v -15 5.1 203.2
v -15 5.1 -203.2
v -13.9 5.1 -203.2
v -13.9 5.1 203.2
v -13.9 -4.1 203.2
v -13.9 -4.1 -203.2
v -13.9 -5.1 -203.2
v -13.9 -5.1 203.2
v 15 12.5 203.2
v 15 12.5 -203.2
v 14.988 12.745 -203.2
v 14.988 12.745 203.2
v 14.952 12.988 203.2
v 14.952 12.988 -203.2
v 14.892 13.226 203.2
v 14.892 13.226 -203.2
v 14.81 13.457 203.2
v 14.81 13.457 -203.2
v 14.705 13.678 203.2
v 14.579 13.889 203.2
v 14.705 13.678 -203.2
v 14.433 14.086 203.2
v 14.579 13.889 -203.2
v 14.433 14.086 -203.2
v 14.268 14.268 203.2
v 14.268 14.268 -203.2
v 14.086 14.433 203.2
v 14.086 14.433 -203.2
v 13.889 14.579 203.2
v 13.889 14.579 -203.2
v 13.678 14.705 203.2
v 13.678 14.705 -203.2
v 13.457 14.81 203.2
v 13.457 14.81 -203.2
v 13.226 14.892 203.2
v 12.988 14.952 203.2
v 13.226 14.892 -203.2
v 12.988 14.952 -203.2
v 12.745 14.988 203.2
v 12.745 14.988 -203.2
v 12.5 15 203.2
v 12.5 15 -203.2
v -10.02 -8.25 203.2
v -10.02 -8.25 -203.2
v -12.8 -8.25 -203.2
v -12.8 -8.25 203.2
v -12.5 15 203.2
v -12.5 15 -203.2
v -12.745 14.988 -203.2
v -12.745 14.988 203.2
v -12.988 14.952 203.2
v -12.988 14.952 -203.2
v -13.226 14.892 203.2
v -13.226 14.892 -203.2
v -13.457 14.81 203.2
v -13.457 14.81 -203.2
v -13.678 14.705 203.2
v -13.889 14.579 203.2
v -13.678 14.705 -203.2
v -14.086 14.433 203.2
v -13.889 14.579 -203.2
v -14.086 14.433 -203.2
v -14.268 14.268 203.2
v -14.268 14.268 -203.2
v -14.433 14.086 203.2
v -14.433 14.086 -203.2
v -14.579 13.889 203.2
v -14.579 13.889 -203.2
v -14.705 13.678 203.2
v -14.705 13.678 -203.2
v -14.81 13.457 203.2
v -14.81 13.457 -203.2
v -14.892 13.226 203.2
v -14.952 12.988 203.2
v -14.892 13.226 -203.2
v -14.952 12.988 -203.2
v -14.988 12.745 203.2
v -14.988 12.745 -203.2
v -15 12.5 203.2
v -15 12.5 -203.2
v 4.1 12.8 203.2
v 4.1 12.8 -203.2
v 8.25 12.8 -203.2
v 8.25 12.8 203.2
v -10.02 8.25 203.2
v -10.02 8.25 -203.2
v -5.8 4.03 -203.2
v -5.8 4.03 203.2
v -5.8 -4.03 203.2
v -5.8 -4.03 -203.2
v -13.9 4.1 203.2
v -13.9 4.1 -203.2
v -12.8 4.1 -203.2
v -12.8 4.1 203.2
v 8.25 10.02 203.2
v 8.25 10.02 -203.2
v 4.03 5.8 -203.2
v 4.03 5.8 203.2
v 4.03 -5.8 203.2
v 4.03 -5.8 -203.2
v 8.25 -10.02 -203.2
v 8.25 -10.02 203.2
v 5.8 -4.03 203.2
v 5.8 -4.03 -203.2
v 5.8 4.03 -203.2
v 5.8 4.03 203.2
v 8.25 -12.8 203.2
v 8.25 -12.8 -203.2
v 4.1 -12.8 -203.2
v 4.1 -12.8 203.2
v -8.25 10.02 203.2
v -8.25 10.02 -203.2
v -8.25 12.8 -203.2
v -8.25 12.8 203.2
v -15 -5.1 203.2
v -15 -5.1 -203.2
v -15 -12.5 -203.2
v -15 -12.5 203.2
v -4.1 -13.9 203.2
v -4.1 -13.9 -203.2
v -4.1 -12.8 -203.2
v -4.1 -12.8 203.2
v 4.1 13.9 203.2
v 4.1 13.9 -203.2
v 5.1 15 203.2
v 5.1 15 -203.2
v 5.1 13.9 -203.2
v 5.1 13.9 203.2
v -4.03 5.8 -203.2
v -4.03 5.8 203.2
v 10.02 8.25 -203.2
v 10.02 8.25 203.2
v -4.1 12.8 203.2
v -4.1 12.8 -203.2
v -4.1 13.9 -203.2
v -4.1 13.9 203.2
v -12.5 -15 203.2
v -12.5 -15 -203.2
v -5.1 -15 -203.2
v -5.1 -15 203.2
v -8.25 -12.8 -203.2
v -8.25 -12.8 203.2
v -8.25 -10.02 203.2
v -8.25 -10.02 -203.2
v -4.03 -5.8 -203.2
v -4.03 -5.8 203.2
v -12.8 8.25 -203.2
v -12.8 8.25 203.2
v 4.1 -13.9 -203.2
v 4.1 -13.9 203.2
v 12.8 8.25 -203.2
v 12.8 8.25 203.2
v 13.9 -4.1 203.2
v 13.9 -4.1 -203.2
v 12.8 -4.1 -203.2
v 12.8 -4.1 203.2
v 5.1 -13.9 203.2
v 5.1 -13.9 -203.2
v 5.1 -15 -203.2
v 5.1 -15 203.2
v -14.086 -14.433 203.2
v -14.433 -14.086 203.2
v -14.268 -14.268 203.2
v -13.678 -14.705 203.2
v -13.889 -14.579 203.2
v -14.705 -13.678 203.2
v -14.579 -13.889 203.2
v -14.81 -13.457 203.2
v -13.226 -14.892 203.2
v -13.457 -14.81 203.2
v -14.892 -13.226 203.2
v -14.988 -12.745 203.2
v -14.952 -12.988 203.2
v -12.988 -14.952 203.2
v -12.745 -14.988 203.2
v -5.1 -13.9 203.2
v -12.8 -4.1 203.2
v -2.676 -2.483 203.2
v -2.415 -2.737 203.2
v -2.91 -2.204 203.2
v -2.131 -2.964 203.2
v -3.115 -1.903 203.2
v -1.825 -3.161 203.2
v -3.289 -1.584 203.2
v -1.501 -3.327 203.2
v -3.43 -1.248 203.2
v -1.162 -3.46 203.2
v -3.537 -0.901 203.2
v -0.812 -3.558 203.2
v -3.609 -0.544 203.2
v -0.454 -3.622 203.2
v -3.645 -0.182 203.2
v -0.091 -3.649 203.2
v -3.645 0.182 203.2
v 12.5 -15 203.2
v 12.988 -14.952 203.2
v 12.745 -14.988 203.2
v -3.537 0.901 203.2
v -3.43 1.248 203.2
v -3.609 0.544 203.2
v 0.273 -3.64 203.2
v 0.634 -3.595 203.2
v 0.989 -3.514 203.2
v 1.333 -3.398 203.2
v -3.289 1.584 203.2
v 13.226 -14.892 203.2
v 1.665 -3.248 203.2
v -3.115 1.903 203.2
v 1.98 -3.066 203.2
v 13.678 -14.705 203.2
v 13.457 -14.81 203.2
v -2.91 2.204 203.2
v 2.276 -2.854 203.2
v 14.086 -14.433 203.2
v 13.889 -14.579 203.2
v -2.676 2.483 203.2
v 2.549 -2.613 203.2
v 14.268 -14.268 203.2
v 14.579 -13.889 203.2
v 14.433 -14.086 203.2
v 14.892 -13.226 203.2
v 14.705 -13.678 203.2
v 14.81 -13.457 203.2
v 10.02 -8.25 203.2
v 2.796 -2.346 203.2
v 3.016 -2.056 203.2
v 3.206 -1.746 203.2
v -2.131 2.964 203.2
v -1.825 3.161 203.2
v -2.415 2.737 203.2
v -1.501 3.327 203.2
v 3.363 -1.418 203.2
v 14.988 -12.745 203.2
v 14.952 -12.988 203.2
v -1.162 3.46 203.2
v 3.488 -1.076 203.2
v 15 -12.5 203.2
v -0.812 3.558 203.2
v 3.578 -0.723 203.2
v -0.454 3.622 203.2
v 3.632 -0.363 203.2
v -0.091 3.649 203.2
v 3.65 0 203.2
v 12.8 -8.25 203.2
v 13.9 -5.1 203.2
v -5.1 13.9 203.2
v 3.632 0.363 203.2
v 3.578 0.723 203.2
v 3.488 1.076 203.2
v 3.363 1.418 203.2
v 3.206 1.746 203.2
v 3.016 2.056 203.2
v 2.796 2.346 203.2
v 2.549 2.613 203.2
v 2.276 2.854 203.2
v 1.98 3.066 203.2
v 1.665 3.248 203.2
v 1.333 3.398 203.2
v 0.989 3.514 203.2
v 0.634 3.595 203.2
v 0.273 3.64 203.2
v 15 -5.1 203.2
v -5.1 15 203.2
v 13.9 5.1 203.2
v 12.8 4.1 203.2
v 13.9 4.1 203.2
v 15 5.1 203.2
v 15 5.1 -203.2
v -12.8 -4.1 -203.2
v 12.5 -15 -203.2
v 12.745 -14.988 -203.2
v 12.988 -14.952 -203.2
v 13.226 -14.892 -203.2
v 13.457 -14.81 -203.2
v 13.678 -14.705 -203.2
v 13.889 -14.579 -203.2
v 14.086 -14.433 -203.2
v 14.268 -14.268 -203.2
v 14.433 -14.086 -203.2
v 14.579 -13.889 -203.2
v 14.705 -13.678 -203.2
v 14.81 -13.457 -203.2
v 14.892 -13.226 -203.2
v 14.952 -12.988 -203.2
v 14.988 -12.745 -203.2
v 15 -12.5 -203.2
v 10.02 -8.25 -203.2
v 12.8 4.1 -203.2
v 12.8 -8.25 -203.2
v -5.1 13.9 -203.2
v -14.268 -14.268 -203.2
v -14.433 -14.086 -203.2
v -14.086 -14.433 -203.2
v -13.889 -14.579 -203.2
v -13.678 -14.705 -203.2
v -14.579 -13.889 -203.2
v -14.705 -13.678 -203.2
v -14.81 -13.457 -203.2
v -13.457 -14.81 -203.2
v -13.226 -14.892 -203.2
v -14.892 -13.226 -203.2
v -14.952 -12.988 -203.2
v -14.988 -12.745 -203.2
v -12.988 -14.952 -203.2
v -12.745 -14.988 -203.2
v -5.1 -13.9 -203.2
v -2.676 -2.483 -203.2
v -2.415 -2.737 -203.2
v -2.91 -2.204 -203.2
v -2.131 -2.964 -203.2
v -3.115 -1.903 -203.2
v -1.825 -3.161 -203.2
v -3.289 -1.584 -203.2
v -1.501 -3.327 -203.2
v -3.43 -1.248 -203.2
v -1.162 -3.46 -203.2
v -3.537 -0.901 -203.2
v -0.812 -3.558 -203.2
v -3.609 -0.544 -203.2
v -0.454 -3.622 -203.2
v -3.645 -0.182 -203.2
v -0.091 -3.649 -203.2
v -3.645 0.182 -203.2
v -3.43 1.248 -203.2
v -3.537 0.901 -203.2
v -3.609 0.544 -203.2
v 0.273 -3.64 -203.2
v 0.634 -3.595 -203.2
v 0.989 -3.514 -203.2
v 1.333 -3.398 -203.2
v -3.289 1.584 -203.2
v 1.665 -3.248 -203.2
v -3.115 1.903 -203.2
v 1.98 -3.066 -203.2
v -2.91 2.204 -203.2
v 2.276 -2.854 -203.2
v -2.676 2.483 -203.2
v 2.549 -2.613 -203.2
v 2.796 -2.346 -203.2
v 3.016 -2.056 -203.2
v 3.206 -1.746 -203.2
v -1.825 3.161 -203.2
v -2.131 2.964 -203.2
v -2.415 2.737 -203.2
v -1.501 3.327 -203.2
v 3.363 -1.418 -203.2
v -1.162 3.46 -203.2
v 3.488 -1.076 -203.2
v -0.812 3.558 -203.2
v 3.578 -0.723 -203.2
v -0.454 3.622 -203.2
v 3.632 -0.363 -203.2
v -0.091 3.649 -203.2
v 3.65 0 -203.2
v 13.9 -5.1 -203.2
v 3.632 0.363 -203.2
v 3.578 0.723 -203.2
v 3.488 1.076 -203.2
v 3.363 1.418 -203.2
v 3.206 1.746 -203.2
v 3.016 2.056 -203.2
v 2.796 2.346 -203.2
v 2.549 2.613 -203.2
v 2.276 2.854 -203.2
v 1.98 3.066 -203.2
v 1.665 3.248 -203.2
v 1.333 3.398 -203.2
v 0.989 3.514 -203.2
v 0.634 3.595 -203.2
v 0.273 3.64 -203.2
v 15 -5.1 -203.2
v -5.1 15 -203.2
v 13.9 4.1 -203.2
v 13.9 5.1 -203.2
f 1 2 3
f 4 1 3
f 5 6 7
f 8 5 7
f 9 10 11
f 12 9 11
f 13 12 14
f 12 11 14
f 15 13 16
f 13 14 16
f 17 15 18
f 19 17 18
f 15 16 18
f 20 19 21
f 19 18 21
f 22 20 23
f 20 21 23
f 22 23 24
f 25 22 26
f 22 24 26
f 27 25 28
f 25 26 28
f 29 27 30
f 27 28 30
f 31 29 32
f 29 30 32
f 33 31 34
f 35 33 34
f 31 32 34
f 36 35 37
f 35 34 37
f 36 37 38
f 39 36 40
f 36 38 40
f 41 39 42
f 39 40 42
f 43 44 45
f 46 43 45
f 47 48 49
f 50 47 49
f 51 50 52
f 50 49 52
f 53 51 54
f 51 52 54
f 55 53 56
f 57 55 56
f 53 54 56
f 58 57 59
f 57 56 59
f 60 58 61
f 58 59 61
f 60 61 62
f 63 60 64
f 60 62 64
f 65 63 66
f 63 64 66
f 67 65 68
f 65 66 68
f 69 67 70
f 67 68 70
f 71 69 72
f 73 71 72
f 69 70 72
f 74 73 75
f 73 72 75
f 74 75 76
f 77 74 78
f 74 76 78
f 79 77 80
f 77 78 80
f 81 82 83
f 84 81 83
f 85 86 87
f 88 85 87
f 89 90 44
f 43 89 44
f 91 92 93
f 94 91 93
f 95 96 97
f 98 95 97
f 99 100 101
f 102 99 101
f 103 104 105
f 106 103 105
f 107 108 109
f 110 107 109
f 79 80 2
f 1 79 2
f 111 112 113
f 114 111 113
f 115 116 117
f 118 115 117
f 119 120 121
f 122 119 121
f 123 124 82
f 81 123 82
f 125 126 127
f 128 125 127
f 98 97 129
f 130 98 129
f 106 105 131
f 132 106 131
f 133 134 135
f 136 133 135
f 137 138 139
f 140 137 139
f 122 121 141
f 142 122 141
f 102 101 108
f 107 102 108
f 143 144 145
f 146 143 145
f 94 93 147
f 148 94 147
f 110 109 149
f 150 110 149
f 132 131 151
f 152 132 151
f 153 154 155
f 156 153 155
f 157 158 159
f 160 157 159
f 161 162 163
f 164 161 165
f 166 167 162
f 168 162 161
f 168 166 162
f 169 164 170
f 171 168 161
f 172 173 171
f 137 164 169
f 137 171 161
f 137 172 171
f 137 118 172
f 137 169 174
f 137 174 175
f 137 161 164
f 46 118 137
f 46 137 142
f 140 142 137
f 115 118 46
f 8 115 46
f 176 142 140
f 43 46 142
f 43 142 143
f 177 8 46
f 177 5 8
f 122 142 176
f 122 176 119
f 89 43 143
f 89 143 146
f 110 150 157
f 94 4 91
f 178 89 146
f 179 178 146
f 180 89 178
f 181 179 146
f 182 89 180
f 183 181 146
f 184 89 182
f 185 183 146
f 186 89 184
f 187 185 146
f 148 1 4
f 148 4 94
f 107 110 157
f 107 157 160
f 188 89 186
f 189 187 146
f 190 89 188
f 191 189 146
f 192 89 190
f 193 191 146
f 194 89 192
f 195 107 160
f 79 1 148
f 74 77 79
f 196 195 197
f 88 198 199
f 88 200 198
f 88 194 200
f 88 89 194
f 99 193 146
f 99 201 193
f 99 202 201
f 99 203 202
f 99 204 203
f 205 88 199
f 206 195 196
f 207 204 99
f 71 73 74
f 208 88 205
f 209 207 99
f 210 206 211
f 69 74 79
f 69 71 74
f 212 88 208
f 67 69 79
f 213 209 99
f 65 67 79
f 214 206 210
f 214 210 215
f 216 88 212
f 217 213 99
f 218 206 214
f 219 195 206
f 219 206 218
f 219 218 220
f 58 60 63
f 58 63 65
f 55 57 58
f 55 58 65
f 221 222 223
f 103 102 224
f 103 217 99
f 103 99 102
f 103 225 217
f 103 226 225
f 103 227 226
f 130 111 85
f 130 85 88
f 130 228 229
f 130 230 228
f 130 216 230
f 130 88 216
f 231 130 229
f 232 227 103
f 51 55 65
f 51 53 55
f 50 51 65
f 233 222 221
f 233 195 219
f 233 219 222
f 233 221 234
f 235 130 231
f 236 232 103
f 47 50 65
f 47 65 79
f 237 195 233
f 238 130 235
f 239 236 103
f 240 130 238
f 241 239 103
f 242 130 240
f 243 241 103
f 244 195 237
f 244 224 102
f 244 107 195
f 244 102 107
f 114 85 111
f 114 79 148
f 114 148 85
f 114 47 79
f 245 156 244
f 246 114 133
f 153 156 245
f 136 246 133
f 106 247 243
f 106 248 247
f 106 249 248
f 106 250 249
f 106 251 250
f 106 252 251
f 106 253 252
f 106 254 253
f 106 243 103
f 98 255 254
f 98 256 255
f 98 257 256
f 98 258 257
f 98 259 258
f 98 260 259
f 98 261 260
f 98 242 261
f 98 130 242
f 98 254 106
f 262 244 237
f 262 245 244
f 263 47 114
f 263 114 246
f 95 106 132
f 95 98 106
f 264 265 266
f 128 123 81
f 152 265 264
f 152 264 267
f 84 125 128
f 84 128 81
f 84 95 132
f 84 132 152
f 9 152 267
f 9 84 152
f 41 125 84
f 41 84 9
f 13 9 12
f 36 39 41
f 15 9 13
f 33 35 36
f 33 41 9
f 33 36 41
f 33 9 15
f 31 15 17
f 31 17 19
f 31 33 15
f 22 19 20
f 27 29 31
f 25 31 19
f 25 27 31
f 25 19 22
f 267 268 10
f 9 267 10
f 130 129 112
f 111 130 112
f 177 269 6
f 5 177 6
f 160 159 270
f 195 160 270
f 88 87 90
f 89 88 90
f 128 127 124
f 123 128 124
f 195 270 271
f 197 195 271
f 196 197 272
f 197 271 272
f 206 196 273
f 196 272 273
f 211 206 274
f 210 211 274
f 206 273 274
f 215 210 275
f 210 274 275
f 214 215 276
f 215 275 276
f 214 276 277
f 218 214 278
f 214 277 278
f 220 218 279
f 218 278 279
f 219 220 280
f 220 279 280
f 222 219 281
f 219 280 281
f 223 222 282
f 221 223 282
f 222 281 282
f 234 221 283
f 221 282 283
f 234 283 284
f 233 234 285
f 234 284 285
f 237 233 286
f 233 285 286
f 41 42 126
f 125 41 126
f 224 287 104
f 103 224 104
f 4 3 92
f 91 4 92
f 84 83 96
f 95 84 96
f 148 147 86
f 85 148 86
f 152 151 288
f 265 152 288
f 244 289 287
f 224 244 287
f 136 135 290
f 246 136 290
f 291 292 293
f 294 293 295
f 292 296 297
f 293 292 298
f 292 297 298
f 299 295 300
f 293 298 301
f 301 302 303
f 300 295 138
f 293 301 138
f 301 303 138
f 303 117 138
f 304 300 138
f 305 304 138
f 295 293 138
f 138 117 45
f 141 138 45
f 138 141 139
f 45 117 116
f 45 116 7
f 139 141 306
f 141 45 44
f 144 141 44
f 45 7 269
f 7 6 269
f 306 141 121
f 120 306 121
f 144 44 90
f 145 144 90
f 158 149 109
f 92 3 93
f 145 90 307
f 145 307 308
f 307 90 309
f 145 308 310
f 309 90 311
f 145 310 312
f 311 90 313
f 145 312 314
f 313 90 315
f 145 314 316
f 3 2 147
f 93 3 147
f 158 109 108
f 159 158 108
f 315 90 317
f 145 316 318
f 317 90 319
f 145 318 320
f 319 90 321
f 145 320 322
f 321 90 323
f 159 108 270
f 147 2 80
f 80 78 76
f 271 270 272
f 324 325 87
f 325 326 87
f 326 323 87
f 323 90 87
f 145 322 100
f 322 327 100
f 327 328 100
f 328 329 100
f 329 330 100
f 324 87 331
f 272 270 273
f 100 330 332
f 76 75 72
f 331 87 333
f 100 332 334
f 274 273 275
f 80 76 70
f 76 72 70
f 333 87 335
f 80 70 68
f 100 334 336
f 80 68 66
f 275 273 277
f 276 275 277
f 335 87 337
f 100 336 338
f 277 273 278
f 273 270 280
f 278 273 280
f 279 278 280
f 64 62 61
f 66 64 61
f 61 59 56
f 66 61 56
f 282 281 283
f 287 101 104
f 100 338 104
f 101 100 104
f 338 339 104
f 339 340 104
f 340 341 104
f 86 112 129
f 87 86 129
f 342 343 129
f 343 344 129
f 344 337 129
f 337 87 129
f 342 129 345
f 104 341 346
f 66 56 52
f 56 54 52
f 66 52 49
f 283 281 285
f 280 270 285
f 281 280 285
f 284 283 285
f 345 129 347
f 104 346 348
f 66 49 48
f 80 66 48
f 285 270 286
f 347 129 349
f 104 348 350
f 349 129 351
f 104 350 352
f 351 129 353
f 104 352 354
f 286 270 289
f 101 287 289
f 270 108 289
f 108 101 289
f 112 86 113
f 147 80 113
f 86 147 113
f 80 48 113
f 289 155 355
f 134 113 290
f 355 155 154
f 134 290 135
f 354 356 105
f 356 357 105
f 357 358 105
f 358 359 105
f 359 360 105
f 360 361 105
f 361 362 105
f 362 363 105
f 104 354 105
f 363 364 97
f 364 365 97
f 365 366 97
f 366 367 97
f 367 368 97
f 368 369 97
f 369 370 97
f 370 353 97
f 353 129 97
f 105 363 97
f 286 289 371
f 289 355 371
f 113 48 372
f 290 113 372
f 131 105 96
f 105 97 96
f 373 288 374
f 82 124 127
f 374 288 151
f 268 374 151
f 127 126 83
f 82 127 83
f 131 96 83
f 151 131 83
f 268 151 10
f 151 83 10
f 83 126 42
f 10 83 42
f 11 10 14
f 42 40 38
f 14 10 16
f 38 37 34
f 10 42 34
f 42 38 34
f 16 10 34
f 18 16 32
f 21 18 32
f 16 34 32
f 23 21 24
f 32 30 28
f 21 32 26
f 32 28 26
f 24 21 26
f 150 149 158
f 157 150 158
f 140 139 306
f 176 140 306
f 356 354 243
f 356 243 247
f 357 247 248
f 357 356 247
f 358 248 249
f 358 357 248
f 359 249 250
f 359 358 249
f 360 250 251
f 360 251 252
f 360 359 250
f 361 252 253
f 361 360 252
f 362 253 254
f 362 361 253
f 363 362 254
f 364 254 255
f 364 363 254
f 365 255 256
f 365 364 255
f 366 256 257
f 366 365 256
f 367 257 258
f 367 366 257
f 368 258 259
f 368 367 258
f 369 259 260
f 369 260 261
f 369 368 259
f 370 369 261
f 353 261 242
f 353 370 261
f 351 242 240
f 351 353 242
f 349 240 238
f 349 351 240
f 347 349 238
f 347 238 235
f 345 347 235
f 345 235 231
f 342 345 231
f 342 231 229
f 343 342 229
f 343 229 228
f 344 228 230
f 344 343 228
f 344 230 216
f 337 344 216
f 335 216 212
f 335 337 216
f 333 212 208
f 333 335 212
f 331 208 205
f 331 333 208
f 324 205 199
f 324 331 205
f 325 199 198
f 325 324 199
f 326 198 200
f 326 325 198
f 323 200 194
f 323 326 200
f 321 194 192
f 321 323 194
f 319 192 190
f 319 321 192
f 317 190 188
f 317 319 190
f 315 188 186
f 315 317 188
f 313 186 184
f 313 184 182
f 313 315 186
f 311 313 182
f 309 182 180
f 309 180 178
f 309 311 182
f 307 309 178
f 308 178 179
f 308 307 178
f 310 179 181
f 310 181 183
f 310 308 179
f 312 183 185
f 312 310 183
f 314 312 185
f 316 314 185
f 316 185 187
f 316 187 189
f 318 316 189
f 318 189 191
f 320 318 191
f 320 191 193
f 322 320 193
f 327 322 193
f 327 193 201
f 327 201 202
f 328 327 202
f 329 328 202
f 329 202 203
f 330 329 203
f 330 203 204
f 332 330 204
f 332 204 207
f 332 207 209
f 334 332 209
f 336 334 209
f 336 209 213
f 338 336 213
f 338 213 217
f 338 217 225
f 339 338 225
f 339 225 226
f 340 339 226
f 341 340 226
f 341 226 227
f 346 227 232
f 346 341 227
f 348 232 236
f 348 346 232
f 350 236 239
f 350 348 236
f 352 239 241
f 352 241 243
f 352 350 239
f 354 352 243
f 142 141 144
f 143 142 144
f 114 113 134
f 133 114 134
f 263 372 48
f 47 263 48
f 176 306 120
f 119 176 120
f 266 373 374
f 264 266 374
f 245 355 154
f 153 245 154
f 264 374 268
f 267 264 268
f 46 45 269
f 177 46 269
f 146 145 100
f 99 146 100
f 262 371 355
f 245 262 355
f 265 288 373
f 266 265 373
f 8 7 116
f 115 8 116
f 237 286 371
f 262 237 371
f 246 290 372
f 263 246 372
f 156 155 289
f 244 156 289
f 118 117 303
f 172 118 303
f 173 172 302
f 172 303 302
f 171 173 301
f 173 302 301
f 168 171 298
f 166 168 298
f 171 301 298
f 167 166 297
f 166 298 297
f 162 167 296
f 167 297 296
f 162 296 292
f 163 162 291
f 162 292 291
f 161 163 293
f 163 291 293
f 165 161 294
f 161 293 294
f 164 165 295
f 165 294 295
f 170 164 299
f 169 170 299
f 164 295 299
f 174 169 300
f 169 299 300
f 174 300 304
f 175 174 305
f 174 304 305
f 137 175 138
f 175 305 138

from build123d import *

# Parameters (mm, degrees)
SKETCH11_R                          = 3.65
BOSCHREXROTH_BOSCH_30X30_V2_1_DEPTH = 406.4


with BuildPart() as part:
    # Sketch11 → Boschrexroth BOSCH_30X30_V2(1) (new body)
    with BuildSketch(Plane.XY.offset(-203.2)):
        with BuildLine():
            Line((0, 5.8), (-4.03, 5.8))
            Line((-4.03, 5.8), (-8.25, 10.02))
            Line((-8.25, 10.02), (-8.25, 12.8))
            Line((-8.25, 12.8), (-4.1, 12.8))
            Line((-4.1, 12.8), (-4.1, 13.9))
            Line((-4.1, 13.9), (-5.1, 13.9))
            Line((-5.1, 13.9), (-5.1, 15))
            Line((-5.1, 15), (-12.5, 15))
            ThreePointArc((-12.5, 15), (-14.267766953, 14.267766953), (-15, 12.5))
            Line((-15, 12.5), (-15, 5.1))
            Line((-15, 5.1), (-13.9, 5.1))
            Line((-13.9, 5.1), (-13.9, 4.1))
            Line((-13.9, 4.1), (-12.8, 4.1))
            Line((-12.8, 4.1), (-12.8, 8.25))
            Line((-12.8, 8.25), (-10.02, 8.25))
            Line((-10.02, 8.25), (-5.8, 4.03))
            Line((-5.8, 4.03), (-5.8, 0))
            Line((-5.8, 0), (-5.8, -4.03))
            Line((-5.8, -4.03), (-10.02, -8.25))
            Line((-10.02, -8.25), (-12.8, -8.25))
            Line((-12.8, -8.25), (-12.8, -4.1))
            Line((-12.8, -4.1), (-13.9, -4.1))
            Line((-13.9, -4.1), (-13.9, -5.1))
            Line((-13.9, -5.1), (-15, -5.1))
            Line((-15, -5.1), (-15, -12.5))
            ThreePointArc((-15, -12.5), (-14.267766953, -14.267766953), (-12.5, -15))
            Line((-12.5, -15), (-5.1, -15))
            Line((-5.1, -15), (-5.1, -13.9))
            Line((-5.1, -13.9), (-4.1, -13.9))
            Line((-4.1, -13.9), (-4.1, -12.8))
            Line((-4.1, -12.8), (-8.25, -12.8))
            Line((-8.25, -12.8), (-8.25, -10.02))
            Line((-8.25, -10.02), (-4.03, -5.8))
            Line((-4.03, -5.8), (4.03, -5.8))
            Line((4.03, -5.8), (8.25, -10.02))
            Line((8.25, -10.02), (8.25, -12.8))
            Line((8.25, -12.8), (4.1, -12.8))
            Line((4.1, -12.8), (4.1, -13.9))
            Line((4.1, -13.9), (5.1, -13.9))
            Line((5.1, -13.9), (5.1, -15))
            Line((5.1, -15), (12.5, -15))
            ThreePointArc((12.5, -15), (14.267766953, -14.267766953), (15, -12.5))
            Line((15, -12.5), (15, -5.1))
            Line((15, -5.1), (13.9, -5.1))
            Line((13.9, -5.1), (13.9, -4.1))
            Line((13.9, -4.1), (12.8, -4.1))
            Line((12.8, -4.1), (12.8, -8.25))
            Line((12.8, -8.25), (10.02, -8.25))
            Line((10.02, -8.25), (5.8, -4.03))
            Line((5.8, -4.03), (5.8, 0))
            Line((5.8, 0), (5.8, 4.03))
            Line((5.8, 4.03), (10.02, 8.25))
            Line((10.02, 8.25), (12.8, 8.25))
            Line((12.8, 8.25), (12.8, 4.1))
            Line((12.8, 4.1), (13.9, 4.1))
            Line((13.9, 4.1), (13.9, 5.1))
            Line((13.9, 5.1), (15, 5.1))
            Line((15, 5.1), (15, 12.5))
            ThreePointArc((15, 12.5), (14.267766953, 14.267766953), (12.5, 15))
            Line((12.5, 15), (5.1, 15))
            Line((5.1, 15), (5.1, 13.9))
            Line((5.1, 13.9), (4.1, 13.9))
            Line((4.1, 13.9), (4.1, 12.8))
            Line((4.1, 12.8), (8.25, 12.8))
            Line((8.25, 12.8), (8.25, 10.02))
            Line((8.25, 10.02), (4.03, 5.8))
            Line((4.03, 5.8), (0, 5.8))
        make_face()
        Circle(SKETCH11_R, mode=Mode.SUBTRACT)
    extrude(amount=BOSCHREXROTH_BOSCH_30X30_V2_1_DEPTH)


solid = part.part
